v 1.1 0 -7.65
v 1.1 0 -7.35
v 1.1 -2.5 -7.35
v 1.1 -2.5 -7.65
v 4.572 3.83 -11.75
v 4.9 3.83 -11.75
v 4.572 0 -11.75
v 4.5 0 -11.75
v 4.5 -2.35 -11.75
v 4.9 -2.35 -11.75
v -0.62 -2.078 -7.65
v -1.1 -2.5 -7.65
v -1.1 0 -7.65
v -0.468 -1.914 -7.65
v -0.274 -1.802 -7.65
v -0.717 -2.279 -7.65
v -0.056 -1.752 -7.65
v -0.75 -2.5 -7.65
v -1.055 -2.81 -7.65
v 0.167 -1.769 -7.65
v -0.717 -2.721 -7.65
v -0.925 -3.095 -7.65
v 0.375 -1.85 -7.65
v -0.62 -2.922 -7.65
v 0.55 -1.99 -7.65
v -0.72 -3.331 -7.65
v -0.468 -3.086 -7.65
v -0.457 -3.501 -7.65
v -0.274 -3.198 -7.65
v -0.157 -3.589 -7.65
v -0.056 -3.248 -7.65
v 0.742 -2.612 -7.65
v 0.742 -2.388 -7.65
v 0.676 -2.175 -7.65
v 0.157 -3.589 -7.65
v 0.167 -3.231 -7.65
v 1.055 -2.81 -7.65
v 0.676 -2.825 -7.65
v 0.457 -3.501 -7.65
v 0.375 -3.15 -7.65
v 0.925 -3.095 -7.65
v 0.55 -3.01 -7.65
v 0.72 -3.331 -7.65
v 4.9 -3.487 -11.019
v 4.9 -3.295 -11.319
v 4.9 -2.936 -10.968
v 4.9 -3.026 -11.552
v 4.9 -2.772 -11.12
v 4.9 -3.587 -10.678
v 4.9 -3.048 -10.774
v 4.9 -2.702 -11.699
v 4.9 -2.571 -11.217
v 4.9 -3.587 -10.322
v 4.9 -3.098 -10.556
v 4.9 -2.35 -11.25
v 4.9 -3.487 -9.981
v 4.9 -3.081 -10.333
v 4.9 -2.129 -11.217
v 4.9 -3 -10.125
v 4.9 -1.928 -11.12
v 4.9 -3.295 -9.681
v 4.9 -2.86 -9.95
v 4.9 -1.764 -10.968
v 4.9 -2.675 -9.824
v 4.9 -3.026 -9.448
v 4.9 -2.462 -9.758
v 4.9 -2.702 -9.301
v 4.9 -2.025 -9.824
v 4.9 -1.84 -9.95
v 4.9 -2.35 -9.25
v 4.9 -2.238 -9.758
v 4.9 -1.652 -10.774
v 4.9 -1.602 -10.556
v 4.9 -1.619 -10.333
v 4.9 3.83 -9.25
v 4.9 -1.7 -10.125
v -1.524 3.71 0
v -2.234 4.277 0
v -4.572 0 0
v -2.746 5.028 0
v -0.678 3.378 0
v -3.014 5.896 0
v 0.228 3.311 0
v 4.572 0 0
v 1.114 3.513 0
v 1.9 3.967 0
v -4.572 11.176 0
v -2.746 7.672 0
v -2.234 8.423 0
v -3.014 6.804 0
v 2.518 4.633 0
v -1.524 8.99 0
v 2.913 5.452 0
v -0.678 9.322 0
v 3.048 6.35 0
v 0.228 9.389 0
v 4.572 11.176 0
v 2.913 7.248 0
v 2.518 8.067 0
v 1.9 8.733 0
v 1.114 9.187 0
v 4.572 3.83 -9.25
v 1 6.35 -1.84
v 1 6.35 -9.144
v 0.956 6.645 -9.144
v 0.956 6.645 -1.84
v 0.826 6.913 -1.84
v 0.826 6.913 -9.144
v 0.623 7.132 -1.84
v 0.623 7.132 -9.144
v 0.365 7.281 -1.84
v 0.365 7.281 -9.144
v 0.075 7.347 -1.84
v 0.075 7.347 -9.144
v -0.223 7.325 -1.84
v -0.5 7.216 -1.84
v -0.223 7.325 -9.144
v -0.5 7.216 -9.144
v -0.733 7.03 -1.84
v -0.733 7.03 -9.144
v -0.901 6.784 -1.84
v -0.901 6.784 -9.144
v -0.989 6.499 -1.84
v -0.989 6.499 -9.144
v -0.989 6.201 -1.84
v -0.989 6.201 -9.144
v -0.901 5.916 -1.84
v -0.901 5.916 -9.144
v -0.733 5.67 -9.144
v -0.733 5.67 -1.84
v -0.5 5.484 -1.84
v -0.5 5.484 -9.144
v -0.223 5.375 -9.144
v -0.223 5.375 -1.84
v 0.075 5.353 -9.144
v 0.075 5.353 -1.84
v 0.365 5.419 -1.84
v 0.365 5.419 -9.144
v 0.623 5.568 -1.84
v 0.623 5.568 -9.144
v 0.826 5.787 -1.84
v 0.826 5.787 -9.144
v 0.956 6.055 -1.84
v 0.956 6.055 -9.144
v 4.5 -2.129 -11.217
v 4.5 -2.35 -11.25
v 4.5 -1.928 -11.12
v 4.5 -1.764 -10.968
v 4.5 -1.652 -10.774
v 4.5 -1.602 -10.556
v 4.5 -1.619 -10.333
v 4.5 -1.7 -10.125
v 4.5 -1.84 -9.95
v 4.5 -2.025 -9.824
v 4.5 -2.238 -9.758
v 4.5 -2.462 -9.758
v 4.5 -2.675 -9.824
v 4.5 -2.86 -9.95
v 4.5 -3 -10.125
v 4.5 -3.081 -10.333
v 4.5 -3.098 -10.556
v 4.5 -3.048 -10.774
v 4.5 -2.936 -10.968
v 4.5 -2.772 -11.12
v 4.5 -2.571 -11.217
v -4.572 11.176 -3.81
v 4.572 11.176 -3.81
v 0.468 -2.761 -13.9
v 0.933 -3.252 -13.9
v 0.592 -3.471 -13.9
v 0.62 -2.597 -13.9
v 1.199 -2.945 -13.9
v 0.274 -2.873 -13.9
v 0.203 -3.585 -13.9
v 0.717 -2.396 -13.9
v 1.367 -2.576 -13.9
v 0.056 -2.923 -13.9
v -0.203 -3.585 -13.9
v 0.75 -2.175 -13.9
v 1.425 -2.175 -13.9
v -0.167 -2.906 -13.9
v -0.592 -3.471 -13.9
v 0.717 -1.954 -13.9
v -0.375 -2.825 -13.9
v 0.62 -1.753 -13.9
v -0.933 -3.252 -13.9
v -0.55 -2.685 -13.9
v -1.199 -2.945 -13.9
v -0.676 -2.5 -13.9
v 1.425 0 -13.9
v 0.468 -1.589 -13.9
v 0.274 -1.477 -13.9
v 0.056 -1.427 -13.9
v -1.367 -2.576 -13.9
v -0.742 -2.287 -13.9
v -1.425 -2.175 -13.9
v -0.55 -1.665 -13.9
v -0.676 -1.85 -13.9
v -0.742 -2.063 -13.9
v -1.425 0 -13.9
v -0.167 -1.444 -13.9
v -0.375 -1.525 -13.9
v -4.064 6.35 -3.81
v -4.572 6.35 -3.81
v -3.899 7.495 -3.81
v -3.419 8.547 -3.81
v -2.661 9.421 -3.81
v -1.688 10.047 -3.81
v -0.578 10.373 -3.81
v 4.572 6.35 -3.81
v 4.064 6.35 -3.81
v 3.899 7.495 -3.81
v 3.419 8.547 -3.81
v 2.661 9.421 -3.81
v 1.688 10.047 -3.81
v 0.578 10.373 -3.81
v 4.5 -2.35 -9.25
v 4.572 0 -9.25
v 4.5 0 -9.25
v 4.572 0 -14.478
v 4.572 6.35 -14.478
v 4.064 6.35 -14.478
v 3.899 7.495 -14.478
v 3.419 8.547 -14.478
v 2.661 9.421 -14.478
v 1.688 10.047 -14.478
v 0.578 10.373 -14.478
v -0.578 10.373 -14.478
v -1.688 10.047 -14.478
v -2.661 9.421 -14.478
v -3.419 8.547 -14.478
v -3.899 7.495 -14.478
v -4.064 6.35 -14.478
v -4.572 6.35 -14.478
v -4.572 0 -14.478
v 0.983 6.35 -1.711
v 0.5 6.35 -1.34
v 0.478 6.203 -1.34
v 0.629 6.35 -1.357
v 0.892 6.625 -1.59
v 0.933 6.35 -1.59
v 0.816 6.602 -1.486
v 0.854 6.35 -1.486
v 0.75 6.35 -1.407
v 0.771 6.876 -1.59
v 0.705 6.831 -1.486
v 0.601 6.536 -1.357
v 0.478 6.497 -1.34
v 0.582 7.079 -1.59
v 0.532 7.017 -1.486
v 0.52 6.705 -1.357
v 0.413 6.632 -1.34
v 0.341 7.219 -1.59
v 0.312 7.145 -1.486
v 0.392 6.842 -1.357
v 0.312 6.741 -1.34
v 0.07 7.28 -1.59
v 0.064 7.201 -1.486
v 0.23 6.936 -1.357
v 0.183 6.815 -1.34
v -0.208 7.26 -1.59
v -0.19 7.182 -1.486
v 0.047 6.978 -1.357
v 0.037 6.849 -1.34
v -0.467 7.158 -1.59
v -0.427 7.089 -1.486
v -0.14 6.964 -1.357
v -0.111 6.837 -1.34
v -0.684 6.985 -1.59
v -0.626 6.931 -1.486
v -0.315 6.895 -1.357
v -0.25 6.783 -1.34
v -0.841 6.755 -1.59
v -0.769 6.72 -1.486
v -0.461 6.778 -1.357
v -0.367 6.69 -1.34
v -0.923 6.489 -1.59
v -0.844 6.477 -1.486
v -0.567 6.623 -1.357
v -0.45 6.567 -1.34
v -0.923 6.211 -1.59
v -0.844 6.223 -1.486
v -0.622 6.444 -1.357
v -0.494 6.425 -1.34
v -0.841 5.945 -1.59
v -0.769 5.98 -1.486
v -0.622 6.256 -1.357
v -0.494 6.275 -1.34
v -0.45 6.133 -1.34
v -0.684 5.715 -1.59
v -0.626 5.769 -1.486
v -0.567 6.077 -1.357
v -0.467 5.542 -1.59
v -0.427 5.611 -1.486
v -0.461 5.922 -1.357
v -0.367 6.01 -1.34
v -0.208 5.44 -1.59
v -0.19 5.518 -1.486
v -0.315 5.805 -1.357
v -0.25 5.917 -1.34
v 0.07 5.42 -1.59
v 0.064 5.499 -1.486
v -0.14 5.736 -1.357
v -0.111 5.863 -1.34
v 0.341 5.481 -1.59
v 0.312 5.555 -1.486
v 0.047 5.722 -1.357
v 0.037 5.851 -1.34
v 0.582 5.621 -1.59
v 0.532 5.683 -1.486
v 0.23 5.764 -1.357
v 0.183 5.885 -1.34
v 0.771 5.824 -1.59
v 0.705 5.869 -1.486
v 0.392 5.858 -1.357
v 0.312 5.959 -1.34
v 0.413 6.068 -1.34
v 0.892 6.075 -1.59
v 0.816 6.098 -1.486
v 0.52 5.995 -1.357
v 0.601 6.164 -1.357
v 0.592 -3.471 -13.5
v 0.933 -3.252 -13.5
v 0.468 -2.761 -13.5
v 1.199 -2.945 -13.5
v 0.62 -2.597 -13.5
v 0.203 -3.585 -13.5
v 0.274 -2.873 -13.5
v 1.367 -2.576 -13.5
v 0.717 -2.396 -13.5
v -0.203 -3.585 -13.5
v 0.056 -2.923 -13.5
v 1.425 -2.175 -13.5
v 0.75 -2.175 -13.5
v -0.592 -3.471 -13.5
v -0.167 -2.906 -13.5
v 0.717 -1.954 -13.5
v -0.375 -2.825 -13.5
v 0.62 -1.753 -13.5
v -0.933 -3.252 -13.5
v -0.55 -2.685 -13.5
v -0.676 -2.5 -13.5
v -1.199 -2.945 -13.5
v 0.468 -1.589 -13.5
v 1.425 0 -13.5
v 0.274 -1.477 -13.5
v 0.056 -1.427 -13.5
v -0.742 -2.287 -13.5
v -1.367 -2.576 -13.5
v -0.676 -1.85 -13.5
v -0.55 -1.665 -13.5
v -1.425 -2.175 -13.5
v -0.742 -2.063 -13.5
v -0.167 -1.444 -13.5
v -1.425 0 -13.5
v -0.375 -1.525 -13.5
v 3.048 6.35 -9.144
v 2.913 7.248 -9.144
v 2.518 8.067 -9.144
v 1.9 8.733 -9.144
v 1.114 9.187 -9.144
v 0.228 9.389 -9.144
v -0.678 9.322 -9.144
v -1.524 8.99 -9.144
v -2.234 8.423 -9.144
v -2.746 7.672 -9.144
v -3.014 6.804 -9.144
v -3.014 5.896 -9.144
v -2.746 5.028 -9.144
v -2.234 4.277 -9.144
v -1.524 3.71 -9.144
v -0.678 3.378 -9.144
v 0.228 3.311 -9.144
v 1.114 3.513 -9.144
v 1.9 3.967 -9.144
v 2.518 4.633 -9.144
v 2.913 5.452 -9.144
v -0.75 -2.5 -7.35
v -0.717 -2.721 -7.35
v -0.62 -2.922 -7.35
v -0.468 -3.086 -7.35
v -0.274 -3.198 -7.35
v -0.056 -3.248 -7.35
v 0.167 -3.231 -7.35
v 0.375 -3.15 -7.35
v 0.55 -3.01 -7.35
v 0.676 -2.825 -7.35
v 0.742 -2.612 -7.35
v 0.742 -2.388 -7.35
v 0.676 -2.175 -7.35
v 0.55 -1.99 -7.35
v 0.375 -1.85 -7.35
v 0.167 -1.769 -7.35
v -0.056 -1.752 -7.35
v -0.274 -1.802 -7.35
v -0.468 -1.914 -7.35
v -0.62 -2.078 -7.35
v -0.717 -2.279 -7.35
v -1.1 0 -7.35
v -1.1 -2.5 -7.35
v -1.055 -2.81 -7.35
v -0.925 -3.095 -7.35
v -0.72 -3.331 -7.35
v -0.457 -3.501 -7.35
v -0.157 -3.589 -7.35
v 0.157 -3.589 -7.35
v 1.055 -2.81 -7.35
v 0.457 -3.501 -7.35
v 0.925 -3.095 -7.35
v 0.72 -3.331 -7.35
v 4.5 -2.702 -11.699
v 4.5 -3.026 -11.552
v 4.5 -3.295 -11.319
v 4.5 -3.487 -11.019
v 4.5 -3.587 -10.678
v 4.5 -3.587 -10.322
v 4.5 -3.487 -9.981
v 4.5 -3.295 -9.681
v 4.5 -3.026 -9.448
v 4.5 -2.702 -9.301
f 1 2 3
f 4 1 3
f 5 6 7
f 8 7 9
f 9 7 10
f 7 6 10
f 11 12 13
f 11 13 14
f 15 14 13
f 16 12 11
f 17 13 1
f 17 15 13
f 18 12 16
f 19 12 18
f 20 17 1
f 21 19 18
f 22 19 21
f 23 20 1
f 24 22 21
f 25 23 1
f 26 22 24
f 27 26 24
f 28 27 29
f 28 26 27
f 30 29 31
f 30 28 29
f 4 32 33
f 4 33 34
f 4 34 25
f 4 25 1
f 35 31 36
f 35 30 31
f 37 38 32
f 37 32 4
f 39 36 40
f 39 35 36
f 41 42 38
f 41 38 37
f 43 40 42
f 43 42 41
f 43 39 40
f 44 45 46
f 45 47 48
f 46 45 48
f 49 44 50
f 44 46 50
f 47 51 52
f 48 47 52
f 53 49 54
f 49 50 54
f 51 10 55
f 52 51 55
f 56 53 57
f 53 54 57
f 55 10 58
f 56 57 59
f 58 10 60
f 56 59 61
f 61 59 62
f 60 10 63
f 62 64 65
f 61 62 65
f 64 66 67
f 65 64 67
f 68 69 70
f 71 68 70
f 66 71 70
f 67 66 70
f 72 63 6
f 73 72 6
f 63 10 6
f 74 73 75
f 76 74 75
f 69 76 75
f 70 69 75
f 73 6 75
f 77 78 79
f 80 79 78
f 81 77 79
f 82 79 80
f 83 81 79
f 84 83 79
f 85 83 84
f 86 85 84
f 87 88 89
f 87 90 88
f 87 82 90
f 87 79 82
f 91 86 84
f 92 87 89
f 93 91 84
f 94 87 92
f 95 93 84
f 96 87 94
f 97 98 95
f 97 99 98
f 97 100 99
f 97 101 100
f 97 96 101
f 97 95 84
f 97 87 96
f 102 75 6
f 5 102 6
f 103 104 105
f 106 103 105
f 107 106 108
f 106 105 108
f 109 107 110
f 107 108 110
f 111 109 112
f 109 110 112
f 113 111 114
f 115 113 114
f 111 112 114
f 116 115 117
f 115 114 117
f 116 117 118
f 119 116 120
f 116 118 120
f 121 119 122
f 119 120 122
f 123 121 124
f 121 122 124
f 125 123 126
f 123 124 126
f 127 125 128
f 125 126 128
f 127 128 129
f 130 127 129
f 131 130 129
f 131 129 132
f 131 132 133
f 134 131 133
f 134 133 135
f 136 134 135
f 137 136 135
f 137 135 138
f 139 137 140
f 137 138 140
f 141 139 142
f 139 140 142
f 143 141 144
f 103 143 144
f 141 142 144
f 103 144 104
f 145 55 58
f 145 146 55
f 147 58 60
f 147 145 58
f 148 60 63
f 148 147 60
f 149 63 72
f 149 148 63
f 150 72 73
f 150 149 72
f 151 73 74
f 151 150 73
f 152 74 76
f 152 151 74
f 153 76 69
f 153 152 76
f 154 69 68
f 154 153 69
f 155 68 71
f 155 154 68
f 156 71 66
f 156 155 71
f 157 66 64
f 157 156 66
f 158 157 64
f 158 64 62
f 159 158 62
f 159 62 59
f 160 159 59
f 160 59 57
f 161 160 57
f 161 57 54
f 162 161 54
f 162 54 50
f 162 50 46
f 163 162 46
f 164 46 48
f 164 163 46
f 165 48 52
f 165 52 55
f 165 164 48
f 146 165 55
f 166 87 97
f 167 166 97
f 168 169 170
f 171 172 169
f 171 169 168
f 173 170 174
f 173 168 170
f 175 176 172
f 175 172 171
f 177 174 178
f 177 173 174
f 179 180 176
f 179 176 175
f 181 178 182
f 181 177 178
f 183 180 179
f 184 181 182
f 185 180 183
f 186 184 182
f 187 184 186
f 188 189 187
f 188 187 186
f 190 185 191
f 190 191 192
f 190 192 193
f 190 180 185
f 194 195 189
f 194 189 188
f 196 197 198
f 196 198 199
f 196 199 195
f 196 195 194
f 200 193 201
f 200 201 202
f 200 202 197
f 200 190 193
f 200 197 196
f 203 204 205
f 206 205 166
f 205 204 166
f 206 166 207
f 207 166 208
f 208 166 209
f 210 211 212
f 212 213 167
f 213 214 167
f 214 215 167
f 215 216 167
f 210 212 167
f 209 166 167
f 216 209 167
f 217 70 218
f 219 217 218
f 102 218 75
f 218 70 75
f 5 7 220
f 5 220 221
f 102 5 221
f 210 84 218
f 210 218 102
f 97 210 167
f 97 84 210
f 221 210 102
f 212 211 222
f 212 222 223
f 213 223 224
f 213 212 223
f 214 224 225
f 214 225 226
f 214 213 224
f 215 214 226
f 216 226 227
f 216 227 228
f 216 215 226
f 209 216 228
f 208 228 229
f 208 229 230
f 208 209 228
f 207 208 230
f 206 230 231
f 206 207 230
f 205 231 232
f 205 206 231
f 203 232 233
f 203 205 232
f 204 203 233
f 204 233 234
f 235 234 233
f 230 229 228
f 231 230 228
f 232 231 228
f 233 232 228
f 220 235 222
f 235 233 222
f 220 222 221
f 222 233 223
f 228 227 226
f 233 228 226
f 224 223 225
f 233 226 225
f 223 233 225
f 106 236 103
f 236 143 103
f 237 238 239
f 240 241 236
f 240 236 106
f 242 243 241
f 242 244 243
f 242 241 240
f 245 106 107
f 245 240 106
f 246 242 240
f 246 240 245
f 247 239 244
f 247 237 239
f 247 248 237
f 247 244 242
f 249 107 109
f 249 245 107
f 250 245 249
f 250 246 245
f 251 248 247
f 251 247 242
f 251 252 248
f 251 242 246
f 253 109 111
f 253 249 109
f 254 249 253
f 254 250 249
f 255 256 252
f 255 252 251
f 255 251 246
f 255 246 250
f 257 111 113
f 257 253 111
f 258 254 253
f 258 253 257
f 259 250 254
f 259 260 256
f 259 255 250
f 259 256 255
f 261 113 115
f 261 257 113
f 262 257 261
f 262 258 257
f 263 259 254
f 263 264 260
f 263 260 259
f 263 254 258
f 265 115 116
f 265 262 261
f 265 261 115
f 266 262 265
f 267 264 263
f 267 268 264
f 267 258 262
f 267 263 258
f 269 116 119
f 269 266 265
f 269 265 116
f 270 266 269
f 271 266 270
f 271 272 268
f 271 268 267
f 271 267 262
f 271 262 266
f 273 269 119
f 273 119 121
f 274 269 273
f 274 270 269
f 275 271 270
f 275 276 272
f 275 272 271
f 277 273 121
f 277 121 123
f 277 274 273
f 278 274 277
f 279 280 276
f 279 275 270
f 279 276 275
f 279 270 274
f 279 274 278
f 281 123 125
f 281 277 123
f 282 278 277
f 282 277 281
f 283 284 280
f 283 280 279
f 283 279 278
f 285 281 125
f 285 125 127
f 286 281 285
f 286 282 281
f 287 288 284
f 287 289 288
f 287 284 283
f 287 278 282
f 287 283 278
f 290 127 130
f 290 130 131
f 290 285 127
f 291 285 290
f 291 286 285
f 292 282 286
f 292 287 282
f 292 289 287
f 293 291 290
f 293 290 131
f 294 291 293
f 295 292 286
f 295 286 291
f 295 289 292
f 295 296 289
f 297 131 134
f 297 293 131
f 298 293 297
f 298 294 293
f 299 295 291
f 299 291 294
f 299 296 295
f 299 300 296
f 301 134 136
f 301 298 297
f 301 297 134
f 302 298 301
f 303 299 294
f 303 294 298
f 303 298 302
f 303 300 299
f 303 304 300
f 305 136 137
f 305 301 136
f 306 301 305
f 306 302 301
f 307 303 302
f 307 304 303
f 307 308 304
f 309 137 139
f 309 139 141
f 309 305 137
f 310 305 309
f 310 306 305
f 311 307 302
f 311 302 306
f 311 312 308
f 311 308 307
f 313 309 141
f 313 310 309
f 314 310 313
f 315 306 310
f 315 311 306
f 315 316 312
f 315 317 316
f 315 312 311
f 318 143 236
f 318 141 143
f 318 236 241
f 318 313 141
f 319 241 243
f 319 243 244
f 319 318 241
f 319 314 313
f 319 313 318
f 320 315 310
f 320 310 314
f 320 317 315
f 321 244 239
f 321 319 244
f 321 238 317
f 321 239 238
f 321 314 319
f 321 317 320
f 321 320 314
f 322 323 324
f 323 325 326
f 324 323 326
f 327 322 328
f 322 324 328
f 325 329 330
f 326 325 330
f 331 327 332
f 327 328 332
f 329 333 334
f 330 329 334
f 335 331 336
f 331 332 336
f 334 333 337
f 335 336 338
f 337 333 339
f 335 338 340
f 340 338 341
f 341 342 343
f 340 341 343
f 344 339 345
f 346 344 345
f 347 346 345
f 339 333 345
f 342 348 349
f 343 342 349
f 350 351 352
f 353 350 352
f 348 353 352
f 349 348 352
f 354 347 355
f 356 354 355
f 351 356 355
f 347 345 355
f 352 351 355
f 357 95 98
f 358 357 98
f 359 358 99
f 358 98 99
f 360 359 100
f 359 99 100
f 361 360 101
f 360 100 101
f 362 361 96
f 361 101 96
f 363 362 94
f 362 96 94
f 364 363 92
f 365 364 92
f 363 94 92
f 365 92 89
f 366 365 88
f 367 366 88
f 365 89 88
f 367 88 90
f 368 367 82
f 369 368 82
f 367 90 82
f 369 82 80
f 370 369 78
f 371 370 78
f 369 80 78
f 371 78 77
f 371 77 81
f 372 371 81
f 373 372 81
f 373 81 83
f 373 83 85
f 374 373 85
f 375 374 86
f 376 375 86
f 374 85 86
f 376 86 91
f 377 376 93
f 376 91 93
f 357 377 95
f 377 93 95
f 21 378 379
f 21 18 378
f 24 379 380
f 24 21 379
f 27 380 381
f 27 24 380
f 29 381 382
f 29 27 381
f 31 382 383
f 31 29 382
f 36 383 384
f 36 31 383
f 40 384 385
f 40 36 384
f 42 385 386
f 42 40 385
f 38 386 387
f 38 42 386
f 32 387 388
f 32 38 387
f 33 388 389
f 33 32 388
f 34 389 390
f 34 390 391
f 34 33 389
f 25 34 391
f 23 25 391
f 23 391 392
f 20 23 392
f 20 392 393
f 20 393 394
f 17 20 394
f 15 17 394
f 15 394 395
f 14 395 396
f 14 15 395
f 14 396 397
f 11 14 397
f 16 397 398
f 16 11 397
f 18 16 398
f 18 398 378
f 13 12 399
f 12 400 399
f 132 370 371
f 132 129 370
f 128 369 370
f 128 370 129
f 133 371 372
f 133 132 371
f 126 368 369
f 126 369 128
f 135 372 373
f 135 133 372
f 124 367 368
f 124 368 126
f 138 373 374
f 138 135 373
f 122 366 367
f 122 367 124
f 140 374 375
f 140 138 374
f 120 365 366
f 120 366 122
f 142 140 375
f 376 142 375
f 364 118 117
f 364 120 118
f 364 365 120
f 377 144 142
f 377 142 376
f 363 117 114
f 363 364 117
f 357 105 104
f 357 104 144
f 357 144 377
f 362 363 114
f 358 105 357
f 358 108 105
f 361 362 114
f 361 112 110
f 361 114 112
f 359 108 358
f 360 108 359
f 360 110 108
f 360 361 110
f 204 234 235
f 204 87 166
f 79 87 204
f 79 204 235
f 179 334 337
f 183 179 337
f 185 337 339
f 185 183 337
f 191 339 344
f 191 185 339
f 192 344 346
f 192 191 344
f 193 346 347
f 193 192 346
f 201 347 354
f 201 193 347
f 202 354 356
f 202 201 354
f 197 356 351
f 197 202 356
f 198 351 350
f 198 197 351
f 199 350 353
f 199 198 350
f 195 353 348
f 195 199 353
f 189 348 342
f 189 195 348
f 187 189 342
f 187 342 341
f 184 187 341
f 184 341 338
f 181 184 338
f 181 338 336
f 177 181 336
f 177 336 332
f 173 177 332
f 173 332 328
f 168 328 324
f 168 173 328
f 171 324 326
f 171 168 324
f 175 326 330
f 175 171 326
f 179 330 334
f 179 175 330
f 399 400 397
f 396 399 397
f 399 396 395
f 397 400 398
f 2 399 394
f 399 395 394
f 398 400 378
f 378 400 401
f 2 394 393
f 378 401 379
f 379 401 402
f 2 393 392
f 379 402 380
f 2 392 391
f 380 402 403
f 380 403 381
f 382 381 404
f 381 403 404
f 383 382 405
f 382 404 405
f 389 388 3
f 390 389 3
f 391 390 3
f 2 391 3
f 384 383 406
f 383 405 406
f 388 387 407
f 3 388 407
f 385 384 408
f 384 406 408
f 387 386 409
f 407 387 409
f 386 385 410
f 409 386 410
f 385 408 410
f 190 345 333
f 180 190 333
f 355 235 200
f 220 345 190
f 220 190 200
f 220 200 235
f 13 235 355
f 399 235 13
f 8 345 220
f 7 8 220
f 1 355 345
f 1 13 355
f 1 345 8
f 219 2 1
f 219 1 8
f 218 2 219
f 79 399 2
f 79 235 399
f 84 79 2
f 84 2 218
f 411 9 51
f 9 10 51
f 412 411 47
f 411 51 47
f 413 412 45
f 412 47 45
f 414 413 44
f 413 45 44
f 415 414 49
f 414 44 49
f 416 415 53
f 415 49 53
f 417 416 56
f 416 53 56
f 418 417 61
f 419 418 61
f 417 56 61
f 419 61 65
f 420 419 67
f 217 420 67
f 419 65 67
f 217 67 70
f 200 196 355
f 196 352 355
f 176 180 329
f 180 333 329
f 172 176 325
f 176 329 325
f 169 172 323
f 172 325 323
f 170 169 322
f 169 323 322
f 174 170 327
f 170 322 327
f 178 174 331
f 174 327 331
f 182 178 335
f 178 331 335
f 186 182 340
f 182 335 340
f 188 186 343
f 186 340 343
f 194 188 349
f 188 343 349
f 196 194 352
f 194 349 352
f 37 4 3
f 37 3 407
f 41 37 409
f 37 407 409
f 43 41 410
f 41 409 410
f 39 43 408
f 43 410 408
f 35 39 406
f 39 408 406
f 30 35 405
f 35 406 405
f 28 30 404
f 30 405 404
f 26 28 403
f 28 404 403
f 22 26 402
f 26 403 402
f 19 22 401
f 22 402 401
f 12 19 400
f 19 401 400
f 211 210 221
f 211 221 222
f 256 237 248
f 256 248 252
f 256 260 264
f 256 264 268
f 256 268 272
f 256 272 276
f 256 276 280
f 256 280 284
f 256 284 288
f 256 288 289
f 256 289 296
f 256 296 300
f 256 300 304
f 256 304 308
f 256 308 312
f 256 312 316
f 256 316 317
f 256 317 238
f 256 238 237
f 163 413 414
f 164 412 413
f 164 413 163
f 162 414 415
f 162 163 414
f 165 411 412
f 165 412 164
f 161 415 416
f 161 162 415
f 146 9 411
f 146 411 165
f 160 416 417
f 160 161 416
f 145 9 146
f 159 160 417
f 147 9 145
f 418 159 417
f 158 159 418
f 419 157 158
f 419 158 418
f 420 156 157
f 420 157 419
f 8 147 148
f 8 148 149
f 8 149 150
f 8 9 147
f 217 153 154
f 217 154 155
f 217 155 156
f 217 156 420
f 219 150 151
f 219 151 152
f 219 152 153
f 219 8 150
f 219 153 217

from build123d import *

# Parameters (mm, degrees)
SKETCH1_W           = 9.144
SKETCH1_H           = 11.176
BASE_EXTRUDE_DEPTH  = 3.81
BOSS_EXTRUDE1_DEPTH = 10.668
SKETCH3_R           = 3.048
CUT_EXTRUDE1_DEPTH  = 9.144
SKETCH4_R           = 1
EXTRUDE1_DEPTH      = 7.804
FILLET1_R           = 0.5
SKETCH5_R           = 0.75
EXTRUDE2_DEPTH      = 0.2
SKETCH6_R           = 0.75
EXTRUDE3_DEPTH      = 0.15
SKETCH7_R           = 0.75
EXTRUDE4_DEPTH      = 0.2


with BuildPart() as part:
    # Sketch1 → Base-Extrude (new body)
    with BuildSketch(Plane.XY):
        with Locations((0, 5.588)):
            Rectangle(SKETCH1_W, SKETCH1_H)
    extrude(amount=-BASE_EXTRUDE_DEPTH)

    # Sketch2 → Boss-Extrude1 (add)
    with BuildSketch(Plane(origin=(0, 0, -3.81), x_dir=(-1, 0, 0), z_dir=(0, 0, -1))):
        with BuildLine():
            Line((-4.572, 0), (-4.572, 6.35))
            Line((-4.572, 6.35), (-4.064, 6.35))
            ThreePointArc((-4.064, 6.35), (0, 10.414), (4.064, 6.35))
            Line((4.064, 6.35), (4.572, 6.35))
            Line((4.572, 6.35), (4.572, 0))
            Line((4.572, 0), (-4.572, 0))
        make_face()
    extrude(amount=BOSS_EXTRUDE1_DEPTH)

    # Sketch3 → Cut-Extrude1 (cut)
    with BuildSketch(Plane.XY):
        with Locations((0, 6.35)):
            Circle(SKETCH3_R)
    extrude(amount=-CUT_EXTRUDE1_DEPTH, mode=Mode.SUBTRACT)

    # Sketch4 → Extrude1 (add)
    with BuildSketch(Plane.XY.offset(-9.144)):
        with Locations((0, 6.35)):
            Circle(SKETCH4_R)
    extrude(amount=EXTRUDE1_DEPTH)

    # Fillet1
    fillet1_edges = [part.edges().sort_by_distance(p)[0] for p in [
        (-1, 6.35, -1.34),
    ]]
    fillet(fillet1_edges, radius=FILLET1_R)

    # Sketch5 → Extrude2 (add, symmetric)
    with BuildSketch(Plane(origin=(4.7, 0, 0), x_dir=(0, 0, -1), z_dir=(1, 0, 0))):
        with BuildLine():
            Line((11.75, 3.83), (11.75, -2.35))
            ThreePointArc((11.75, -2.35), (10.5, -3.6), (9.25, -2.35))
            Line((9.25, -2.35), (9.25, 3.83))
            Line((9.25, 3.83), (11.75, 3.83))
        make_face()
        with Locations((10.5, -2.35)):
            Circle(SKETCH5_R, mode=Mode.SUBTRACT)
    extrude(amount=EXTRUDE2_DEPTH, both=True)

    # Sketch6 → Extrude3 (add, symmetric)
    with BuildSketch(Plane(origin=(0, 0, -7.5), x_dir=(-1, 0, 0), z_dir=(0, 0, 1))):
        with BuildLine():
            Line((-1.1, 0), (-1.1, 2.5))
            ThreePointArc((-1.1, 2.5), (0, 3.6), (1.1, 2.5))
            Line((1.1, 2.5), (1.1, 0))
            Line((1.1, 0), (-1.1, 0))
        make_face()
        with Locations((0, 2.5)):
            Circle(SKETCH6_R, mode=Mode.SUBTRACT)
    extrude(amount=EXTRUDE3_DEPTH, both=True)

    # Sketch7 → Extrude4 (add, symmetric)
    with BuildSketch(Plane.XY.offset(-13.7)):
        with BuildLine():
            Line((1.425, 0), (1.425, -2.175))
            ThreePointArc((1.425, -2.175), (0, -3.6), (-1.425, -2.175))
            Line((-1.425, -2.175), (-1.425, 0))
            Line((-1.425, 0), (1.425, 0))
        make_face()
        with Locations((0, -2.175)):
            Circle(SKETCH7_R, mode=Mode.SUBTRACT)
    extrude(amount=EXTRUDE4_DEPTH, both=True)


solid = part.part
